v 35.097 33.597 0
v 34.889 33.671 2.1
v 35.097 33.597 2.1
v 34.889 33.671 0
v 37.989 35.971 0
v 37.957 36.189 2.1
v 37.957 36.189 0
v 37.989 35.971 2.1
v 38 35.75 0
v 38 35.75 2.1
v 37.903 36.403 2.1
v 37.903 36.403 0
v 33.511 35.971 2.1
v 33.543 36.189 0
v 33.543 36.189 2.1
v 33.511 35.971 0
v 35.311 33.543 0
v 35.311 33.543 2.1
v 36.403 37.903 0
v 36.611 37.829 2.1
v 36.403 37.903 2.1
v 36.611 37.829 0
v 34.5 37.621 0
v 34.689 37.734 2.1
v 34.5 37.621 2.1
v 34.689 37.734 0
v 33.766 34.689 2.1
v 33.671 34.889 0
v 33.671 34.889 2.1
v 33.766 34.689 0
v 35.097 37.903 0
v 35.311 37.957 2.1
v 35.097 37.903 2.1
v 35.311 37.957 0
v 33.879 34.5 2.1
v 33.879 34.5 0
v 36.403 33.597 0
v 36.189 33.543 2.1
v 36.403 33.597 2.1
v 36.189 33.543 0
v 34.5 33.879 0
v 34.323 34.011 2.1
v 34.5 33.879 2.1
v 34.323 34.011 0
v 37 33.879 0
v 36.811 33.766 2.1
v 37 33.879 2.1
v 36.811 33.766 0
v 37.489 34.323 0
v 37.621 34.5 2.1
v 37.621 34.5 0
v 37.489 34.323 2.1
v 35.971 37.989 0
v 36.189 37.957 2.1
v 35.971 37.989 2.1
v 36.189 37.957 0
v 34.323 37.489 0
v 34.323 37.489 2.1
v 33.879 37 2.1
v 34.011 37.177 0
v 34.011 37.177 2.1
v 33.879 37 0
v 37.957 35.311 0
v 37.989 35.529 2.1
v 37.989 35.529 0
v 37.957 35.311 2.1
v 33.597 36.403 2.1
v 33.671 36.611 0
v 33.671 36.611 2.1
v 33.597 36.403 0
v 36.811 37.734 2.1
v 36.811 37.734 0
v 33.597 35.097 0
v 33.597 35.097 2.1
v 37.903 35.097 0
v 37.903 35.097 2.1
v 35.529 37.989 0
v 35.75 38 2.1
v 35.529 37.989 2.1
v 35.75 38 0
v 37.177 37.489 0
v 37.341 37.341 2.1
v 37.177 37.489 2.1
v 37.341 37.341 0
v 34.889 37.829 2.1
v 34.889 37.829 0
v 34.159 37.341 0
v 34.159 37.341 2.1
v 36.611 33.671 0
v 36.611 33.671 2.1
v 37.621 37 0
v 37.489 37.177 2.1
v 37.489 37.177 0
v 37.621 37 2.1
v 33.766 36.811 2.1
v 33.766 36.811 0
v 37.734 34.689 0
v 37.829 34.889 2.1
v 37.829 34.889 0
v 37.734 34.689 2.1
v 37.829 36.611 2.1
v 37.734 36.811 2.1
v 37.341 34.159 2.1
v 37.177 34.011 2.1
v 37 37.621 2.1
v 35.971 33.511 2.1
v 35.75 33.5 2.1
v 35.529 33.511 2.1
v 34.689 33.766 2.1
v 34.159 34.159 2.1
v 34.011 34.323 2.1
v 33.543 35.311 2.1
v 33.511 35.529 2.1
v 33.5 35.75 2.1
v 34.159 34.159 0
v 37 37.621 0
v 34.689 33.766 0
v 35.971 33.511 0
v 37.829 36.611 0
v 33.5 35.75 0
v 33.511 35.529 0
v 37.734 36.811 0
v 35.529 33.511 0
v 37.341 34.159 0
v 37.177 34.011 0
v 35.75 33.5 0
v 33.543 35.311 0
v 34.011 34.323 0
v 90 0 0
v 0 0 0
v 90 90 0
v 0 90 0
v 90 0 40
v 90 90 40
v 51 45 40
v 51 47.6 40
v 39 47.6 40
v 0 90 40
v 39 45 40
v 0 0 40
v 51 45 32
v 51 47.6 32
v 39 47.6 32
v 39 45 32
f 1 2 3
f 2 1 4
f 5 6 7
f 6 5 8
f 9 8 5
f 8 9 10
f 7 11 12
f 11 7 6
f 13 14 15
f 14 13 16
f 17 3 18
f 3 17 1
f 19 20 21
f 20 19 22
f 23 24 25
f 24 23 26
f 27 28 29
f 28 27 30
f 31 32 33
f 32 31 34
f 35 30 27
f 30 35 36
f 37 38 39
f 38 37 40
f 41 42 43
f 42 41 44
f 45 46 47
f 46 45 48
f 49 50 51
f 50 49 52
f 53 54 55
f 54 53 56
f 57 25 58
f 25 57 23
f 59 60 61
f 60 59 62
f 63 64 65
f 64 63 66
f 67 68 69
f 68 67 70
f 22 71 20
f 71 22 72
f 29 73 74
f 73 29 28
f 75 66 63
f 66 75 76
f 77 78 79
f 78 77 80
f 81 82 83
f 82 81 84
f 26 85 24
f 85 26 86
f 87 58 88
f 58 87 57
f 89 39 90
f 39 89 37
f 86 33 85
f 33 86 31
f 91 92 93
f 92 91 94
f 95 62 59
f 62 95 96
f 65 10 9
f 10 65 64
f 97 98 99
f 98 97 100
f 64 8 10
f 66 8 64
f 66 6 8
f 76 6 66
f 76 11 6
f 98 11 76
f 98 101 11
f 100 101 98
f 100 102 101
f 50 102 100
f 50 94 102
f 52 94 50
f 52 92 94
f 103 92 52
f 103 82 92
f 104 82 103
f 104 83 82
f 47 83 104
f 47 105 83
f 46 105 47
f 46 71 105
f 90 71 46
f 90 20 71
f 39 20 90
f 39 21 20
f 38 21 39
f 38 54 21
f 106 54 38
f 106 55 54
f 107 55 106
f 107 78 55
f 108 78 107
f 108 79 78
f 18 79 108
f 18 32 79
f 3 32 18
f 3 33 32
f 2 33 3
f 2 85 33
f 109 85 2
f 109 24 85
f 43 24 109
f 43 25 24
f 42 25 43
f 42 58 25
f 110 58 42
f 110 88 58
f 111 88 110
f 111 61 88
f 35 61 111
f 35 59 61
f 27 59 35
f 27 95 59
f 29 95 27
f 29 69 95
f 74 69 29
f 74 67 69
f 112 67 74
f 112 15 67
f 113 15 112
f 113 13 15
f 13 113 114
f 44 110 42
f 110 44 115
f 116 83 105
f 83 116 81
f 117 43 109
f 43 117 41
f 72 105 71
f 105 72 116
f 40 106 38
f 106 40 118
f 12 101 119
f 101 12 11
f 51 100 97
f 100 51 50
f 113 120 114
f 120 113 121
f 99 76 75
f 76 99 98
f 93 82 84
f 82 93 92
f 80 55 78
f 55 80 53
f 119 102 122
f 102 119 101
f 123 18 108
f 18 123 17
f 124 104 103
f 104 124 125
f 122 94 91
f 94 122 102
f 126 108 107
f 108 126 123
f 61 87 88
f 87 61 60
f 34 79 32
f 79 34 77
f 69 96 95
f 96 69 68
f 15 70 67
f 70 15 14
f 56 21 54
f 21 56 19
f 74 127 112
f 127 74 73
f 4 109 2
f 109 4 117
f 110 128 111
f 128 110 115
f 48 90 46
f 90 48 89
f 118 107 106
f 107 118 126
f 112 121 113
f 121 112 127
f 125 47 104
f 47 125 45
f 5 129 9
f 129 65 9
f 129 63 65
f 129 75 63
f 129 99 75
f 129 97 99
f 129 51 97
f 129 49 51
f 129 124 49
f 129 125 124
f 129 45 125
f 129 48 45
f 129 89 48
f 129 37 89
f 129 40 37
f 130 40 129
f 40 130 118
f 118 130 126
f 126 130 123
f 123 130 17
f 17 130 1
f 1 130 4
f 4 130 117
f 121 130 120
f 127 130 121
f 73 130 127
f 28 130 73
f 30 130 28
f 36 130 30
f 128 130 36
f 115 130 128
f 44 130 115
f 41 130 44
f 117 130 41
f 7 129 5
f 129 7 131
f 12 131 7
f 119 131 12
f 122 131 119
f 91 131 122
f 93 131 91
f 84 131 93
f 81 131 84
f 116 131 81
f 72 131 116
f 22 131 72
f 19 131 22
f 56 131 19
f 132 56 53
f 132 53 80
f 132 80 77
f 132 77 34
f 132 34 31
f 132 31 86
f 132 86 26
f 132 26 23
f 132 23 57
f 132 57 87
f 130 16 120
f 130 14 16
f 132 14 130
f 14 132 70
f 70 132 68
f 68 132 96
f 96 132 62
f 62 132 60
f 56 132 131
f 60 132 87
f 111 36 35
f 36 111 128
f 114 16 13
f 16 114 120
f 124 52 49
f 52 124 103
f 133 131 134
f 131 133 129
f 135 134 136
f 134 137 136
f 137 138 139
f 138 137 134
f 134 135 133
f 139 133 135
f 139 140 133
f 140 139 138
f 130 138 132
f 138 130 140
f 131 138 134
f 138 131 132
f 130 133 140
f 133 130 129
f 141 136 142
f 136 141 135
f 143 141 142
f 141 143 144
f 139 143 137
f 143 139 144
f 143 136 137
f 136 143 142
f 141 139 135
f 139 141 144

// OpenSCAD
// DIY Magnetic Stirrer Housing - based on an 80mm PC fan.
// Orientation: Upside down. Top plate on bed (z=0), walls rise to z=40.
// Outer size: 90x90mm.

// Dimensions
outer_w = 90;
outer_h = 90;
top_t   = 2;
wall_t  = 2.5;
box_h   = 40; // Total height from bed to open top

// Fan mounting hole pattern
mounting_hole_d = 4.5;
mounting_pitch = 71.5;

// Cable notch
notch_w = 12;
notch_start_z = 32; // Bottom of notch
notch_end_z = 40;   // Top of notch (open edge)

$fn = 64;

// Calculate notch position
notch_x_start = (outer_w - notch_w) / 2;
notch_y       = outer_h / 2;

// Calculate hole positions
hole_x = mounting_pitch / 2;
hole_y = mounting_pitch / 2;

difference() {
    // Main block
    translate([0, 0, 0]) 
        cube([outer_w, outer_h, box_h]);
    
    // Subtract mounting holes (4 holes)
    for (i = [-1, 1]) {
        for (j = [-1, 1]) {
            translate([i * hole_x, j * hole_y, 0]) {
                cylinder(h = top_t + 0.1, d = mounting_hole_d);
            }
        }
    }
    
    // Subtract cable notch
    translate([notch_x_start, notch_y, notch_start_z]) {
        cube([notch_w, wall_t + 0.1, notch_end_z - notch_start_z]);
    }
}
